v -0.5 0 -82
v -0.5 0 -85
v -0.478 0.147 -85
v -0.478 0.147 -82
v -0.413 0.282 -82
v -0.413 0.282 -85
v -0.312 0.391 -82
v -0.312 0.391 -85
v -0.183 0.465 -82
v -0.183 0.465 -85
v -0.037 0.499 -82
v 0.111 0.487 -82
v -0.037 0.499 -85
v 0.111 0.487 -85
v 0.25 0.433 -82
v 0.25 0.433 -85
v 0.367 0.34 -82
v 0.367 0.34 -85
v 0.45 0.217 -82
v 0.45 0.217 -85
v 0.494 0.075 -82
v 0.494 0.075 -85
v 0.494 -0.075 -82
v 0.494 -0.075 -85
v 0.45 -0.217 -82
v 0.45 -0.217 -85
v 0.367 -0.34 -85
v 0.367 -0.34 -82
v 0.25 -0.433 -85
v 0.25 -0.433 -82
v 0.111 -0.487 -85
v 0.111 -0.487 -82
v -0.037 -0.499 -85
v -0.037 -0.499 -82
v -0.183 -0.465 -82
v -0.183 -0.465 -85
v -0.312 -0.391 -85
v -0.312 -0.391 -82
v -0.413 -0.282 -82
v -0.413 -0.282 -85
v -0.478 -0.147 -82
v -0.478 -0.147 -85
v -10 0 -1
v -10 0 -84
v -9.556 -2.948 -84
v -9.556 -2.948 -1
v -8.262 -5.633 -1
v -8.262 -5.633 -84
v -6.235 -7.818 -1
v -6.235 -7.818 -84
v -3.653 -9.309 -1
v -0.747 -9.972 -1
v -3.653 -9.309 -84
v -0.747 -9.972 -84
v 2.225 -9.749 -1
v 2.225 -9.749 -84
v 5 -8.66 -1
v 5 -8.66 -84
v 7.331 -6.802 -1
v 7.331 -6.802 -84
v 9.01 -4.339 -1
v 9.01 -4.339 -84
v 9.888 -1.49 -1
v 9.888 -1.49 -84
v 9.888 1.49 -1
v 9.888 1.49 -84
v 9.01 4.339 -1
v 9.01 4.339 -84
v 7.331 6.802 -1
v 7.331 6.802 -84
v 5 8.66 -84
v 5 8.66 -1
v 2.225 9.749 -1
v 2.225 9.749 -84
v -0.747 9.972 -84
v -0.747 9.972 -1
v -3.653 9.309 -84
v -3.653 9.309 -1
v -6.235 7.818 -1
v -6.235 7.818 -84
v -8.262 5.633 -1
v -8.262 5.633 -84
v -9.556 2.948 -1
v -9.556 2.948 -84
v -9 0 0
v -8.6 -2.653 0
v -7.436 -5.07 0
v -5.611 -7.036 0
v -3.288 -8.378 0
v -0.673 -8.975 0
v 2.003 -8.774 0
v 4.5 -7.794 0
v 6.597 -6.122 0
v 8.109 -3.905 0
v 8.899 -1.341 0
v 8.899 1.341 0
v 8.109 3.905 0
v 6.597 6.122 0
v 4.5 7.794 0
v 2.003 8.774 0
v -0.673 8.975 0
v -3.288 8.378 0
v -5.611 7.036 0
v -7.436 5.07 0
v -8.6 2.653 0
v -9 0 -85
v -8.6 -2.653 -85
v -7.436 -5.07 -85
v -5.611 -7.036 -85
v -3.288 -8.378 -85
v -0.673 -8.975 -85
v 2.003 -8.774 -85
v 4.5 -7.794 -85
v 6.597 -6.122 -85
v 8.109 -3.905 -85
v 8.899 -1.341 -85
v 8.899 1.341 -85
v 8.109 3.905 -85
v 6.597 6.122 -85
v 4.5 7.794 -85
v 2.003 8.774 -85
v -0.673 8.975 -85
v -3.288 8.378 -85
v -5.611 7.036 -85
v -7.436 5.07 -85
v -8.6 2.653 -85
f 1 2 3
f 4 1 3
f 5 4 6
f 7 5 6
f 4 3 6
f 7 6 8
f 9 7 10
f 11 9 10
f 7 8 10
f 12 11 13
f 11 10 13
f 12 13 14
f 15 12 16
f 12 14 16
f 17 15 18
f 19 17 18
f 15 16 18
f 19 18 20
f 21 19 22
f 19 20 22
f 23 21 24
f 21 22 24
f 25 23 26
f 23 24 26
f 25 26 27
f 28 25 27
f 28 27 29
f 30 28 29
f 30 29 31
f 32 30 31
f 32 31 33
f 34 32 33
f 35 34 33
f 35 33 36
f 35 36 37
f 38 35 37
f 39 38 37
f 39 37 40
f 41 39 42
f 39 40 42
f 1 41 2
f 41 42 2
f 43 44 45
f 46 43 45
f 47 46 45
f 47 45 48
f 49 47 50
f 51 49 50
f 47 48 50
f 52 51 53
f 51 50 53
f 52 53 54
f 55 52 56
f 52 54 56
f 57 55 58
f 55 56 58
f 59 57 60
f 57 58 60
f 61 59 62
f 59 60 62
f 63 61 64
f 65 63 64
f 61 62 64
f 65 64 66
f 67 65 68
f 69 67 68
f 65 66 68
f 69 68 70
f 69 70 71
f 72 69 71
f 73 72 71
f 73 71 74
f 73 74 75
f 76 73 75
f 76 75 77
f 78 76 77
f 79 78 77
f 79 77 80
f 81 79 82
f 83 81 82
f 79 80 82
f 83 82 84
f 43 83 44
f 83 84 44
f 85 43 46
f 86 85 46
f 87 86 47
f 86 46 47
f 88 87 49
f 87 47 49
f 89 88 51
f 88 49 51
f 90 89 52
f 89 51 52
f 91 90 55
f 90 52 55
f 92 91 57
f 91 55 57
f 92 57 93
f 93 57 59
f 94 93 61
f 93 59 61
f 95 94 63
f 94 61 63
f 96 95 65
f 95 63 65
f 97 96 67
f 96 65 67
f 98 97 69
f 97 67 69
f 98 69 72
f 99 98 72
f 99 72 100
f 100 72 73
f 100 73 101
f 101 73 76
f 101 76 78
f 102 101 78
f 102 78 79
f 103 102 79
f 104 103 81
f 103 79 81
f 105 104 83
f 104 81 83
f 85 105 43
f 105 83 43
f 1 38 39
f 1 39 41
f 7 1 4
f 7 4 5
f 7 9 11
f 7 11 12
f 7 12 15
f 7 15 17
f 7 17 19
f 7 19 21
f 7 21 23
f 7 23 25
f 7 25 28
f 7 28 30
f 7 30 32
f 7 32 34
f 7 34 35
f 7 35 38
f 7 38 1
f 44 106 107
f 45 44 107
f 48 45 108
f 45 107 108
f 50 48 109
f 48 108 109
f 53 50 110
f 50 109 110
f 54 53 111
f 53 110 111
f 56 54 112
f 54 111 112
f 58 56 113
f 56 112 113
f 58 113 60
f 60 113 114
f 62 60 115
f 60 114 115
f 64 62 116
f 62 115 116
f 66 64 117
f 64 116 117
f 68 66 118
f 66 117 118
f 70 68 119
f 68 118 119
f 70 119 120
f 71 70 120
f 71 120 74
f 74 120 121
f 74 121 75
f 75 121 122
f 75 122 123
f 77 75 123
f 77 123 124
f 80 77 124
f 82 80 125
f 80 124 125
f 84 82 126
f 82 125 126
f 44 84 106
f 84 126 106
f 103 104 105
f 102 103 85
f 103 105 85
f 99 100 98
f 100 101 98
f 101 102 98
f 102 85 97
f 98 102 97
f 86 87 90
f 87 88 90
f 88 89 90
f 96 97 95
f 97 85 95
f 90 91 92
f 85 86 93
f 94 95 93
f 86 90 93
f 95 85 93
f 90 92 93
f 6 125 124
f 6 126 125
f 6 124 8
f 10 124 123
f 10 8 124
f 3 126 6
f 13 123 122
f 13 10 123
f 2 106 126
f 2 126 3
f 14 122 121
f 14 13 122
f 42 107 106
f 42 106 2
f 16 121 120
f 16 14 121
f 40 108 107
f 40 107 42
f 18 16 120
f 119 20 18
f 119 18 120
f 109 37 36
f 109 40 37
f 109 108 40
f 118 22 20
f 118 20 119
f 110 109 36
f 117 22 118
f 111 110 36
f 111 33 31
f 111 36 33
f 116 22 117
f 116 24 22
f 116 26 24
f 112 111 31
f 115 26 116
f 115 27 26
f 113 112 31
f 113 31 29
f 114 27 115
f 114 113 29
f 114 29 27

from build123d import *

# Parameters (mm, degrees)
SKETCH1_W          = 10
SKETCH1_H          = 85
CHAMFER1_SIZE      = 1
SKETCH2_R          = 0.5
CUT_EXTRUDE1_DEPTH = 3


with BuildPart() as part:
    # Sketch1 → Revolve1 (revolve)
    with BuildSketch(Plane(origin=(0, 0, 0), x_dir=(1, 0, 0), z_dir=(0, 1, 0))):
        with Locations((5, 42.5)):
            Rectangle(SKETCH1_W, SKETCH1_H)
    revolve(axis=Axis((0, 0, -85), (0, 0, 1)))

    # Chamfer1
    chamfer1_edges = [part.edges().sort_by_distance(p)[0] for p in [
        (-10, 0, -85),
        (-10, 0, 0),
    ]]
    chamfer(chamfer1_edges, length=CHAMFER1_SIZE)

    # Sketch2 → Cut-Extrude1 (cut)
    with BuildSketch(Plane(origin=(0, 0, -85), x_dir=(-1, 0, 0), z_dir=(0, 0, -1))):
        Circle(SKETCH2_R)
    extrude(amount=-CUT_EXTRUDE1_DEPTH, mode=Mode.SUBTRACT)


solid = part.part
